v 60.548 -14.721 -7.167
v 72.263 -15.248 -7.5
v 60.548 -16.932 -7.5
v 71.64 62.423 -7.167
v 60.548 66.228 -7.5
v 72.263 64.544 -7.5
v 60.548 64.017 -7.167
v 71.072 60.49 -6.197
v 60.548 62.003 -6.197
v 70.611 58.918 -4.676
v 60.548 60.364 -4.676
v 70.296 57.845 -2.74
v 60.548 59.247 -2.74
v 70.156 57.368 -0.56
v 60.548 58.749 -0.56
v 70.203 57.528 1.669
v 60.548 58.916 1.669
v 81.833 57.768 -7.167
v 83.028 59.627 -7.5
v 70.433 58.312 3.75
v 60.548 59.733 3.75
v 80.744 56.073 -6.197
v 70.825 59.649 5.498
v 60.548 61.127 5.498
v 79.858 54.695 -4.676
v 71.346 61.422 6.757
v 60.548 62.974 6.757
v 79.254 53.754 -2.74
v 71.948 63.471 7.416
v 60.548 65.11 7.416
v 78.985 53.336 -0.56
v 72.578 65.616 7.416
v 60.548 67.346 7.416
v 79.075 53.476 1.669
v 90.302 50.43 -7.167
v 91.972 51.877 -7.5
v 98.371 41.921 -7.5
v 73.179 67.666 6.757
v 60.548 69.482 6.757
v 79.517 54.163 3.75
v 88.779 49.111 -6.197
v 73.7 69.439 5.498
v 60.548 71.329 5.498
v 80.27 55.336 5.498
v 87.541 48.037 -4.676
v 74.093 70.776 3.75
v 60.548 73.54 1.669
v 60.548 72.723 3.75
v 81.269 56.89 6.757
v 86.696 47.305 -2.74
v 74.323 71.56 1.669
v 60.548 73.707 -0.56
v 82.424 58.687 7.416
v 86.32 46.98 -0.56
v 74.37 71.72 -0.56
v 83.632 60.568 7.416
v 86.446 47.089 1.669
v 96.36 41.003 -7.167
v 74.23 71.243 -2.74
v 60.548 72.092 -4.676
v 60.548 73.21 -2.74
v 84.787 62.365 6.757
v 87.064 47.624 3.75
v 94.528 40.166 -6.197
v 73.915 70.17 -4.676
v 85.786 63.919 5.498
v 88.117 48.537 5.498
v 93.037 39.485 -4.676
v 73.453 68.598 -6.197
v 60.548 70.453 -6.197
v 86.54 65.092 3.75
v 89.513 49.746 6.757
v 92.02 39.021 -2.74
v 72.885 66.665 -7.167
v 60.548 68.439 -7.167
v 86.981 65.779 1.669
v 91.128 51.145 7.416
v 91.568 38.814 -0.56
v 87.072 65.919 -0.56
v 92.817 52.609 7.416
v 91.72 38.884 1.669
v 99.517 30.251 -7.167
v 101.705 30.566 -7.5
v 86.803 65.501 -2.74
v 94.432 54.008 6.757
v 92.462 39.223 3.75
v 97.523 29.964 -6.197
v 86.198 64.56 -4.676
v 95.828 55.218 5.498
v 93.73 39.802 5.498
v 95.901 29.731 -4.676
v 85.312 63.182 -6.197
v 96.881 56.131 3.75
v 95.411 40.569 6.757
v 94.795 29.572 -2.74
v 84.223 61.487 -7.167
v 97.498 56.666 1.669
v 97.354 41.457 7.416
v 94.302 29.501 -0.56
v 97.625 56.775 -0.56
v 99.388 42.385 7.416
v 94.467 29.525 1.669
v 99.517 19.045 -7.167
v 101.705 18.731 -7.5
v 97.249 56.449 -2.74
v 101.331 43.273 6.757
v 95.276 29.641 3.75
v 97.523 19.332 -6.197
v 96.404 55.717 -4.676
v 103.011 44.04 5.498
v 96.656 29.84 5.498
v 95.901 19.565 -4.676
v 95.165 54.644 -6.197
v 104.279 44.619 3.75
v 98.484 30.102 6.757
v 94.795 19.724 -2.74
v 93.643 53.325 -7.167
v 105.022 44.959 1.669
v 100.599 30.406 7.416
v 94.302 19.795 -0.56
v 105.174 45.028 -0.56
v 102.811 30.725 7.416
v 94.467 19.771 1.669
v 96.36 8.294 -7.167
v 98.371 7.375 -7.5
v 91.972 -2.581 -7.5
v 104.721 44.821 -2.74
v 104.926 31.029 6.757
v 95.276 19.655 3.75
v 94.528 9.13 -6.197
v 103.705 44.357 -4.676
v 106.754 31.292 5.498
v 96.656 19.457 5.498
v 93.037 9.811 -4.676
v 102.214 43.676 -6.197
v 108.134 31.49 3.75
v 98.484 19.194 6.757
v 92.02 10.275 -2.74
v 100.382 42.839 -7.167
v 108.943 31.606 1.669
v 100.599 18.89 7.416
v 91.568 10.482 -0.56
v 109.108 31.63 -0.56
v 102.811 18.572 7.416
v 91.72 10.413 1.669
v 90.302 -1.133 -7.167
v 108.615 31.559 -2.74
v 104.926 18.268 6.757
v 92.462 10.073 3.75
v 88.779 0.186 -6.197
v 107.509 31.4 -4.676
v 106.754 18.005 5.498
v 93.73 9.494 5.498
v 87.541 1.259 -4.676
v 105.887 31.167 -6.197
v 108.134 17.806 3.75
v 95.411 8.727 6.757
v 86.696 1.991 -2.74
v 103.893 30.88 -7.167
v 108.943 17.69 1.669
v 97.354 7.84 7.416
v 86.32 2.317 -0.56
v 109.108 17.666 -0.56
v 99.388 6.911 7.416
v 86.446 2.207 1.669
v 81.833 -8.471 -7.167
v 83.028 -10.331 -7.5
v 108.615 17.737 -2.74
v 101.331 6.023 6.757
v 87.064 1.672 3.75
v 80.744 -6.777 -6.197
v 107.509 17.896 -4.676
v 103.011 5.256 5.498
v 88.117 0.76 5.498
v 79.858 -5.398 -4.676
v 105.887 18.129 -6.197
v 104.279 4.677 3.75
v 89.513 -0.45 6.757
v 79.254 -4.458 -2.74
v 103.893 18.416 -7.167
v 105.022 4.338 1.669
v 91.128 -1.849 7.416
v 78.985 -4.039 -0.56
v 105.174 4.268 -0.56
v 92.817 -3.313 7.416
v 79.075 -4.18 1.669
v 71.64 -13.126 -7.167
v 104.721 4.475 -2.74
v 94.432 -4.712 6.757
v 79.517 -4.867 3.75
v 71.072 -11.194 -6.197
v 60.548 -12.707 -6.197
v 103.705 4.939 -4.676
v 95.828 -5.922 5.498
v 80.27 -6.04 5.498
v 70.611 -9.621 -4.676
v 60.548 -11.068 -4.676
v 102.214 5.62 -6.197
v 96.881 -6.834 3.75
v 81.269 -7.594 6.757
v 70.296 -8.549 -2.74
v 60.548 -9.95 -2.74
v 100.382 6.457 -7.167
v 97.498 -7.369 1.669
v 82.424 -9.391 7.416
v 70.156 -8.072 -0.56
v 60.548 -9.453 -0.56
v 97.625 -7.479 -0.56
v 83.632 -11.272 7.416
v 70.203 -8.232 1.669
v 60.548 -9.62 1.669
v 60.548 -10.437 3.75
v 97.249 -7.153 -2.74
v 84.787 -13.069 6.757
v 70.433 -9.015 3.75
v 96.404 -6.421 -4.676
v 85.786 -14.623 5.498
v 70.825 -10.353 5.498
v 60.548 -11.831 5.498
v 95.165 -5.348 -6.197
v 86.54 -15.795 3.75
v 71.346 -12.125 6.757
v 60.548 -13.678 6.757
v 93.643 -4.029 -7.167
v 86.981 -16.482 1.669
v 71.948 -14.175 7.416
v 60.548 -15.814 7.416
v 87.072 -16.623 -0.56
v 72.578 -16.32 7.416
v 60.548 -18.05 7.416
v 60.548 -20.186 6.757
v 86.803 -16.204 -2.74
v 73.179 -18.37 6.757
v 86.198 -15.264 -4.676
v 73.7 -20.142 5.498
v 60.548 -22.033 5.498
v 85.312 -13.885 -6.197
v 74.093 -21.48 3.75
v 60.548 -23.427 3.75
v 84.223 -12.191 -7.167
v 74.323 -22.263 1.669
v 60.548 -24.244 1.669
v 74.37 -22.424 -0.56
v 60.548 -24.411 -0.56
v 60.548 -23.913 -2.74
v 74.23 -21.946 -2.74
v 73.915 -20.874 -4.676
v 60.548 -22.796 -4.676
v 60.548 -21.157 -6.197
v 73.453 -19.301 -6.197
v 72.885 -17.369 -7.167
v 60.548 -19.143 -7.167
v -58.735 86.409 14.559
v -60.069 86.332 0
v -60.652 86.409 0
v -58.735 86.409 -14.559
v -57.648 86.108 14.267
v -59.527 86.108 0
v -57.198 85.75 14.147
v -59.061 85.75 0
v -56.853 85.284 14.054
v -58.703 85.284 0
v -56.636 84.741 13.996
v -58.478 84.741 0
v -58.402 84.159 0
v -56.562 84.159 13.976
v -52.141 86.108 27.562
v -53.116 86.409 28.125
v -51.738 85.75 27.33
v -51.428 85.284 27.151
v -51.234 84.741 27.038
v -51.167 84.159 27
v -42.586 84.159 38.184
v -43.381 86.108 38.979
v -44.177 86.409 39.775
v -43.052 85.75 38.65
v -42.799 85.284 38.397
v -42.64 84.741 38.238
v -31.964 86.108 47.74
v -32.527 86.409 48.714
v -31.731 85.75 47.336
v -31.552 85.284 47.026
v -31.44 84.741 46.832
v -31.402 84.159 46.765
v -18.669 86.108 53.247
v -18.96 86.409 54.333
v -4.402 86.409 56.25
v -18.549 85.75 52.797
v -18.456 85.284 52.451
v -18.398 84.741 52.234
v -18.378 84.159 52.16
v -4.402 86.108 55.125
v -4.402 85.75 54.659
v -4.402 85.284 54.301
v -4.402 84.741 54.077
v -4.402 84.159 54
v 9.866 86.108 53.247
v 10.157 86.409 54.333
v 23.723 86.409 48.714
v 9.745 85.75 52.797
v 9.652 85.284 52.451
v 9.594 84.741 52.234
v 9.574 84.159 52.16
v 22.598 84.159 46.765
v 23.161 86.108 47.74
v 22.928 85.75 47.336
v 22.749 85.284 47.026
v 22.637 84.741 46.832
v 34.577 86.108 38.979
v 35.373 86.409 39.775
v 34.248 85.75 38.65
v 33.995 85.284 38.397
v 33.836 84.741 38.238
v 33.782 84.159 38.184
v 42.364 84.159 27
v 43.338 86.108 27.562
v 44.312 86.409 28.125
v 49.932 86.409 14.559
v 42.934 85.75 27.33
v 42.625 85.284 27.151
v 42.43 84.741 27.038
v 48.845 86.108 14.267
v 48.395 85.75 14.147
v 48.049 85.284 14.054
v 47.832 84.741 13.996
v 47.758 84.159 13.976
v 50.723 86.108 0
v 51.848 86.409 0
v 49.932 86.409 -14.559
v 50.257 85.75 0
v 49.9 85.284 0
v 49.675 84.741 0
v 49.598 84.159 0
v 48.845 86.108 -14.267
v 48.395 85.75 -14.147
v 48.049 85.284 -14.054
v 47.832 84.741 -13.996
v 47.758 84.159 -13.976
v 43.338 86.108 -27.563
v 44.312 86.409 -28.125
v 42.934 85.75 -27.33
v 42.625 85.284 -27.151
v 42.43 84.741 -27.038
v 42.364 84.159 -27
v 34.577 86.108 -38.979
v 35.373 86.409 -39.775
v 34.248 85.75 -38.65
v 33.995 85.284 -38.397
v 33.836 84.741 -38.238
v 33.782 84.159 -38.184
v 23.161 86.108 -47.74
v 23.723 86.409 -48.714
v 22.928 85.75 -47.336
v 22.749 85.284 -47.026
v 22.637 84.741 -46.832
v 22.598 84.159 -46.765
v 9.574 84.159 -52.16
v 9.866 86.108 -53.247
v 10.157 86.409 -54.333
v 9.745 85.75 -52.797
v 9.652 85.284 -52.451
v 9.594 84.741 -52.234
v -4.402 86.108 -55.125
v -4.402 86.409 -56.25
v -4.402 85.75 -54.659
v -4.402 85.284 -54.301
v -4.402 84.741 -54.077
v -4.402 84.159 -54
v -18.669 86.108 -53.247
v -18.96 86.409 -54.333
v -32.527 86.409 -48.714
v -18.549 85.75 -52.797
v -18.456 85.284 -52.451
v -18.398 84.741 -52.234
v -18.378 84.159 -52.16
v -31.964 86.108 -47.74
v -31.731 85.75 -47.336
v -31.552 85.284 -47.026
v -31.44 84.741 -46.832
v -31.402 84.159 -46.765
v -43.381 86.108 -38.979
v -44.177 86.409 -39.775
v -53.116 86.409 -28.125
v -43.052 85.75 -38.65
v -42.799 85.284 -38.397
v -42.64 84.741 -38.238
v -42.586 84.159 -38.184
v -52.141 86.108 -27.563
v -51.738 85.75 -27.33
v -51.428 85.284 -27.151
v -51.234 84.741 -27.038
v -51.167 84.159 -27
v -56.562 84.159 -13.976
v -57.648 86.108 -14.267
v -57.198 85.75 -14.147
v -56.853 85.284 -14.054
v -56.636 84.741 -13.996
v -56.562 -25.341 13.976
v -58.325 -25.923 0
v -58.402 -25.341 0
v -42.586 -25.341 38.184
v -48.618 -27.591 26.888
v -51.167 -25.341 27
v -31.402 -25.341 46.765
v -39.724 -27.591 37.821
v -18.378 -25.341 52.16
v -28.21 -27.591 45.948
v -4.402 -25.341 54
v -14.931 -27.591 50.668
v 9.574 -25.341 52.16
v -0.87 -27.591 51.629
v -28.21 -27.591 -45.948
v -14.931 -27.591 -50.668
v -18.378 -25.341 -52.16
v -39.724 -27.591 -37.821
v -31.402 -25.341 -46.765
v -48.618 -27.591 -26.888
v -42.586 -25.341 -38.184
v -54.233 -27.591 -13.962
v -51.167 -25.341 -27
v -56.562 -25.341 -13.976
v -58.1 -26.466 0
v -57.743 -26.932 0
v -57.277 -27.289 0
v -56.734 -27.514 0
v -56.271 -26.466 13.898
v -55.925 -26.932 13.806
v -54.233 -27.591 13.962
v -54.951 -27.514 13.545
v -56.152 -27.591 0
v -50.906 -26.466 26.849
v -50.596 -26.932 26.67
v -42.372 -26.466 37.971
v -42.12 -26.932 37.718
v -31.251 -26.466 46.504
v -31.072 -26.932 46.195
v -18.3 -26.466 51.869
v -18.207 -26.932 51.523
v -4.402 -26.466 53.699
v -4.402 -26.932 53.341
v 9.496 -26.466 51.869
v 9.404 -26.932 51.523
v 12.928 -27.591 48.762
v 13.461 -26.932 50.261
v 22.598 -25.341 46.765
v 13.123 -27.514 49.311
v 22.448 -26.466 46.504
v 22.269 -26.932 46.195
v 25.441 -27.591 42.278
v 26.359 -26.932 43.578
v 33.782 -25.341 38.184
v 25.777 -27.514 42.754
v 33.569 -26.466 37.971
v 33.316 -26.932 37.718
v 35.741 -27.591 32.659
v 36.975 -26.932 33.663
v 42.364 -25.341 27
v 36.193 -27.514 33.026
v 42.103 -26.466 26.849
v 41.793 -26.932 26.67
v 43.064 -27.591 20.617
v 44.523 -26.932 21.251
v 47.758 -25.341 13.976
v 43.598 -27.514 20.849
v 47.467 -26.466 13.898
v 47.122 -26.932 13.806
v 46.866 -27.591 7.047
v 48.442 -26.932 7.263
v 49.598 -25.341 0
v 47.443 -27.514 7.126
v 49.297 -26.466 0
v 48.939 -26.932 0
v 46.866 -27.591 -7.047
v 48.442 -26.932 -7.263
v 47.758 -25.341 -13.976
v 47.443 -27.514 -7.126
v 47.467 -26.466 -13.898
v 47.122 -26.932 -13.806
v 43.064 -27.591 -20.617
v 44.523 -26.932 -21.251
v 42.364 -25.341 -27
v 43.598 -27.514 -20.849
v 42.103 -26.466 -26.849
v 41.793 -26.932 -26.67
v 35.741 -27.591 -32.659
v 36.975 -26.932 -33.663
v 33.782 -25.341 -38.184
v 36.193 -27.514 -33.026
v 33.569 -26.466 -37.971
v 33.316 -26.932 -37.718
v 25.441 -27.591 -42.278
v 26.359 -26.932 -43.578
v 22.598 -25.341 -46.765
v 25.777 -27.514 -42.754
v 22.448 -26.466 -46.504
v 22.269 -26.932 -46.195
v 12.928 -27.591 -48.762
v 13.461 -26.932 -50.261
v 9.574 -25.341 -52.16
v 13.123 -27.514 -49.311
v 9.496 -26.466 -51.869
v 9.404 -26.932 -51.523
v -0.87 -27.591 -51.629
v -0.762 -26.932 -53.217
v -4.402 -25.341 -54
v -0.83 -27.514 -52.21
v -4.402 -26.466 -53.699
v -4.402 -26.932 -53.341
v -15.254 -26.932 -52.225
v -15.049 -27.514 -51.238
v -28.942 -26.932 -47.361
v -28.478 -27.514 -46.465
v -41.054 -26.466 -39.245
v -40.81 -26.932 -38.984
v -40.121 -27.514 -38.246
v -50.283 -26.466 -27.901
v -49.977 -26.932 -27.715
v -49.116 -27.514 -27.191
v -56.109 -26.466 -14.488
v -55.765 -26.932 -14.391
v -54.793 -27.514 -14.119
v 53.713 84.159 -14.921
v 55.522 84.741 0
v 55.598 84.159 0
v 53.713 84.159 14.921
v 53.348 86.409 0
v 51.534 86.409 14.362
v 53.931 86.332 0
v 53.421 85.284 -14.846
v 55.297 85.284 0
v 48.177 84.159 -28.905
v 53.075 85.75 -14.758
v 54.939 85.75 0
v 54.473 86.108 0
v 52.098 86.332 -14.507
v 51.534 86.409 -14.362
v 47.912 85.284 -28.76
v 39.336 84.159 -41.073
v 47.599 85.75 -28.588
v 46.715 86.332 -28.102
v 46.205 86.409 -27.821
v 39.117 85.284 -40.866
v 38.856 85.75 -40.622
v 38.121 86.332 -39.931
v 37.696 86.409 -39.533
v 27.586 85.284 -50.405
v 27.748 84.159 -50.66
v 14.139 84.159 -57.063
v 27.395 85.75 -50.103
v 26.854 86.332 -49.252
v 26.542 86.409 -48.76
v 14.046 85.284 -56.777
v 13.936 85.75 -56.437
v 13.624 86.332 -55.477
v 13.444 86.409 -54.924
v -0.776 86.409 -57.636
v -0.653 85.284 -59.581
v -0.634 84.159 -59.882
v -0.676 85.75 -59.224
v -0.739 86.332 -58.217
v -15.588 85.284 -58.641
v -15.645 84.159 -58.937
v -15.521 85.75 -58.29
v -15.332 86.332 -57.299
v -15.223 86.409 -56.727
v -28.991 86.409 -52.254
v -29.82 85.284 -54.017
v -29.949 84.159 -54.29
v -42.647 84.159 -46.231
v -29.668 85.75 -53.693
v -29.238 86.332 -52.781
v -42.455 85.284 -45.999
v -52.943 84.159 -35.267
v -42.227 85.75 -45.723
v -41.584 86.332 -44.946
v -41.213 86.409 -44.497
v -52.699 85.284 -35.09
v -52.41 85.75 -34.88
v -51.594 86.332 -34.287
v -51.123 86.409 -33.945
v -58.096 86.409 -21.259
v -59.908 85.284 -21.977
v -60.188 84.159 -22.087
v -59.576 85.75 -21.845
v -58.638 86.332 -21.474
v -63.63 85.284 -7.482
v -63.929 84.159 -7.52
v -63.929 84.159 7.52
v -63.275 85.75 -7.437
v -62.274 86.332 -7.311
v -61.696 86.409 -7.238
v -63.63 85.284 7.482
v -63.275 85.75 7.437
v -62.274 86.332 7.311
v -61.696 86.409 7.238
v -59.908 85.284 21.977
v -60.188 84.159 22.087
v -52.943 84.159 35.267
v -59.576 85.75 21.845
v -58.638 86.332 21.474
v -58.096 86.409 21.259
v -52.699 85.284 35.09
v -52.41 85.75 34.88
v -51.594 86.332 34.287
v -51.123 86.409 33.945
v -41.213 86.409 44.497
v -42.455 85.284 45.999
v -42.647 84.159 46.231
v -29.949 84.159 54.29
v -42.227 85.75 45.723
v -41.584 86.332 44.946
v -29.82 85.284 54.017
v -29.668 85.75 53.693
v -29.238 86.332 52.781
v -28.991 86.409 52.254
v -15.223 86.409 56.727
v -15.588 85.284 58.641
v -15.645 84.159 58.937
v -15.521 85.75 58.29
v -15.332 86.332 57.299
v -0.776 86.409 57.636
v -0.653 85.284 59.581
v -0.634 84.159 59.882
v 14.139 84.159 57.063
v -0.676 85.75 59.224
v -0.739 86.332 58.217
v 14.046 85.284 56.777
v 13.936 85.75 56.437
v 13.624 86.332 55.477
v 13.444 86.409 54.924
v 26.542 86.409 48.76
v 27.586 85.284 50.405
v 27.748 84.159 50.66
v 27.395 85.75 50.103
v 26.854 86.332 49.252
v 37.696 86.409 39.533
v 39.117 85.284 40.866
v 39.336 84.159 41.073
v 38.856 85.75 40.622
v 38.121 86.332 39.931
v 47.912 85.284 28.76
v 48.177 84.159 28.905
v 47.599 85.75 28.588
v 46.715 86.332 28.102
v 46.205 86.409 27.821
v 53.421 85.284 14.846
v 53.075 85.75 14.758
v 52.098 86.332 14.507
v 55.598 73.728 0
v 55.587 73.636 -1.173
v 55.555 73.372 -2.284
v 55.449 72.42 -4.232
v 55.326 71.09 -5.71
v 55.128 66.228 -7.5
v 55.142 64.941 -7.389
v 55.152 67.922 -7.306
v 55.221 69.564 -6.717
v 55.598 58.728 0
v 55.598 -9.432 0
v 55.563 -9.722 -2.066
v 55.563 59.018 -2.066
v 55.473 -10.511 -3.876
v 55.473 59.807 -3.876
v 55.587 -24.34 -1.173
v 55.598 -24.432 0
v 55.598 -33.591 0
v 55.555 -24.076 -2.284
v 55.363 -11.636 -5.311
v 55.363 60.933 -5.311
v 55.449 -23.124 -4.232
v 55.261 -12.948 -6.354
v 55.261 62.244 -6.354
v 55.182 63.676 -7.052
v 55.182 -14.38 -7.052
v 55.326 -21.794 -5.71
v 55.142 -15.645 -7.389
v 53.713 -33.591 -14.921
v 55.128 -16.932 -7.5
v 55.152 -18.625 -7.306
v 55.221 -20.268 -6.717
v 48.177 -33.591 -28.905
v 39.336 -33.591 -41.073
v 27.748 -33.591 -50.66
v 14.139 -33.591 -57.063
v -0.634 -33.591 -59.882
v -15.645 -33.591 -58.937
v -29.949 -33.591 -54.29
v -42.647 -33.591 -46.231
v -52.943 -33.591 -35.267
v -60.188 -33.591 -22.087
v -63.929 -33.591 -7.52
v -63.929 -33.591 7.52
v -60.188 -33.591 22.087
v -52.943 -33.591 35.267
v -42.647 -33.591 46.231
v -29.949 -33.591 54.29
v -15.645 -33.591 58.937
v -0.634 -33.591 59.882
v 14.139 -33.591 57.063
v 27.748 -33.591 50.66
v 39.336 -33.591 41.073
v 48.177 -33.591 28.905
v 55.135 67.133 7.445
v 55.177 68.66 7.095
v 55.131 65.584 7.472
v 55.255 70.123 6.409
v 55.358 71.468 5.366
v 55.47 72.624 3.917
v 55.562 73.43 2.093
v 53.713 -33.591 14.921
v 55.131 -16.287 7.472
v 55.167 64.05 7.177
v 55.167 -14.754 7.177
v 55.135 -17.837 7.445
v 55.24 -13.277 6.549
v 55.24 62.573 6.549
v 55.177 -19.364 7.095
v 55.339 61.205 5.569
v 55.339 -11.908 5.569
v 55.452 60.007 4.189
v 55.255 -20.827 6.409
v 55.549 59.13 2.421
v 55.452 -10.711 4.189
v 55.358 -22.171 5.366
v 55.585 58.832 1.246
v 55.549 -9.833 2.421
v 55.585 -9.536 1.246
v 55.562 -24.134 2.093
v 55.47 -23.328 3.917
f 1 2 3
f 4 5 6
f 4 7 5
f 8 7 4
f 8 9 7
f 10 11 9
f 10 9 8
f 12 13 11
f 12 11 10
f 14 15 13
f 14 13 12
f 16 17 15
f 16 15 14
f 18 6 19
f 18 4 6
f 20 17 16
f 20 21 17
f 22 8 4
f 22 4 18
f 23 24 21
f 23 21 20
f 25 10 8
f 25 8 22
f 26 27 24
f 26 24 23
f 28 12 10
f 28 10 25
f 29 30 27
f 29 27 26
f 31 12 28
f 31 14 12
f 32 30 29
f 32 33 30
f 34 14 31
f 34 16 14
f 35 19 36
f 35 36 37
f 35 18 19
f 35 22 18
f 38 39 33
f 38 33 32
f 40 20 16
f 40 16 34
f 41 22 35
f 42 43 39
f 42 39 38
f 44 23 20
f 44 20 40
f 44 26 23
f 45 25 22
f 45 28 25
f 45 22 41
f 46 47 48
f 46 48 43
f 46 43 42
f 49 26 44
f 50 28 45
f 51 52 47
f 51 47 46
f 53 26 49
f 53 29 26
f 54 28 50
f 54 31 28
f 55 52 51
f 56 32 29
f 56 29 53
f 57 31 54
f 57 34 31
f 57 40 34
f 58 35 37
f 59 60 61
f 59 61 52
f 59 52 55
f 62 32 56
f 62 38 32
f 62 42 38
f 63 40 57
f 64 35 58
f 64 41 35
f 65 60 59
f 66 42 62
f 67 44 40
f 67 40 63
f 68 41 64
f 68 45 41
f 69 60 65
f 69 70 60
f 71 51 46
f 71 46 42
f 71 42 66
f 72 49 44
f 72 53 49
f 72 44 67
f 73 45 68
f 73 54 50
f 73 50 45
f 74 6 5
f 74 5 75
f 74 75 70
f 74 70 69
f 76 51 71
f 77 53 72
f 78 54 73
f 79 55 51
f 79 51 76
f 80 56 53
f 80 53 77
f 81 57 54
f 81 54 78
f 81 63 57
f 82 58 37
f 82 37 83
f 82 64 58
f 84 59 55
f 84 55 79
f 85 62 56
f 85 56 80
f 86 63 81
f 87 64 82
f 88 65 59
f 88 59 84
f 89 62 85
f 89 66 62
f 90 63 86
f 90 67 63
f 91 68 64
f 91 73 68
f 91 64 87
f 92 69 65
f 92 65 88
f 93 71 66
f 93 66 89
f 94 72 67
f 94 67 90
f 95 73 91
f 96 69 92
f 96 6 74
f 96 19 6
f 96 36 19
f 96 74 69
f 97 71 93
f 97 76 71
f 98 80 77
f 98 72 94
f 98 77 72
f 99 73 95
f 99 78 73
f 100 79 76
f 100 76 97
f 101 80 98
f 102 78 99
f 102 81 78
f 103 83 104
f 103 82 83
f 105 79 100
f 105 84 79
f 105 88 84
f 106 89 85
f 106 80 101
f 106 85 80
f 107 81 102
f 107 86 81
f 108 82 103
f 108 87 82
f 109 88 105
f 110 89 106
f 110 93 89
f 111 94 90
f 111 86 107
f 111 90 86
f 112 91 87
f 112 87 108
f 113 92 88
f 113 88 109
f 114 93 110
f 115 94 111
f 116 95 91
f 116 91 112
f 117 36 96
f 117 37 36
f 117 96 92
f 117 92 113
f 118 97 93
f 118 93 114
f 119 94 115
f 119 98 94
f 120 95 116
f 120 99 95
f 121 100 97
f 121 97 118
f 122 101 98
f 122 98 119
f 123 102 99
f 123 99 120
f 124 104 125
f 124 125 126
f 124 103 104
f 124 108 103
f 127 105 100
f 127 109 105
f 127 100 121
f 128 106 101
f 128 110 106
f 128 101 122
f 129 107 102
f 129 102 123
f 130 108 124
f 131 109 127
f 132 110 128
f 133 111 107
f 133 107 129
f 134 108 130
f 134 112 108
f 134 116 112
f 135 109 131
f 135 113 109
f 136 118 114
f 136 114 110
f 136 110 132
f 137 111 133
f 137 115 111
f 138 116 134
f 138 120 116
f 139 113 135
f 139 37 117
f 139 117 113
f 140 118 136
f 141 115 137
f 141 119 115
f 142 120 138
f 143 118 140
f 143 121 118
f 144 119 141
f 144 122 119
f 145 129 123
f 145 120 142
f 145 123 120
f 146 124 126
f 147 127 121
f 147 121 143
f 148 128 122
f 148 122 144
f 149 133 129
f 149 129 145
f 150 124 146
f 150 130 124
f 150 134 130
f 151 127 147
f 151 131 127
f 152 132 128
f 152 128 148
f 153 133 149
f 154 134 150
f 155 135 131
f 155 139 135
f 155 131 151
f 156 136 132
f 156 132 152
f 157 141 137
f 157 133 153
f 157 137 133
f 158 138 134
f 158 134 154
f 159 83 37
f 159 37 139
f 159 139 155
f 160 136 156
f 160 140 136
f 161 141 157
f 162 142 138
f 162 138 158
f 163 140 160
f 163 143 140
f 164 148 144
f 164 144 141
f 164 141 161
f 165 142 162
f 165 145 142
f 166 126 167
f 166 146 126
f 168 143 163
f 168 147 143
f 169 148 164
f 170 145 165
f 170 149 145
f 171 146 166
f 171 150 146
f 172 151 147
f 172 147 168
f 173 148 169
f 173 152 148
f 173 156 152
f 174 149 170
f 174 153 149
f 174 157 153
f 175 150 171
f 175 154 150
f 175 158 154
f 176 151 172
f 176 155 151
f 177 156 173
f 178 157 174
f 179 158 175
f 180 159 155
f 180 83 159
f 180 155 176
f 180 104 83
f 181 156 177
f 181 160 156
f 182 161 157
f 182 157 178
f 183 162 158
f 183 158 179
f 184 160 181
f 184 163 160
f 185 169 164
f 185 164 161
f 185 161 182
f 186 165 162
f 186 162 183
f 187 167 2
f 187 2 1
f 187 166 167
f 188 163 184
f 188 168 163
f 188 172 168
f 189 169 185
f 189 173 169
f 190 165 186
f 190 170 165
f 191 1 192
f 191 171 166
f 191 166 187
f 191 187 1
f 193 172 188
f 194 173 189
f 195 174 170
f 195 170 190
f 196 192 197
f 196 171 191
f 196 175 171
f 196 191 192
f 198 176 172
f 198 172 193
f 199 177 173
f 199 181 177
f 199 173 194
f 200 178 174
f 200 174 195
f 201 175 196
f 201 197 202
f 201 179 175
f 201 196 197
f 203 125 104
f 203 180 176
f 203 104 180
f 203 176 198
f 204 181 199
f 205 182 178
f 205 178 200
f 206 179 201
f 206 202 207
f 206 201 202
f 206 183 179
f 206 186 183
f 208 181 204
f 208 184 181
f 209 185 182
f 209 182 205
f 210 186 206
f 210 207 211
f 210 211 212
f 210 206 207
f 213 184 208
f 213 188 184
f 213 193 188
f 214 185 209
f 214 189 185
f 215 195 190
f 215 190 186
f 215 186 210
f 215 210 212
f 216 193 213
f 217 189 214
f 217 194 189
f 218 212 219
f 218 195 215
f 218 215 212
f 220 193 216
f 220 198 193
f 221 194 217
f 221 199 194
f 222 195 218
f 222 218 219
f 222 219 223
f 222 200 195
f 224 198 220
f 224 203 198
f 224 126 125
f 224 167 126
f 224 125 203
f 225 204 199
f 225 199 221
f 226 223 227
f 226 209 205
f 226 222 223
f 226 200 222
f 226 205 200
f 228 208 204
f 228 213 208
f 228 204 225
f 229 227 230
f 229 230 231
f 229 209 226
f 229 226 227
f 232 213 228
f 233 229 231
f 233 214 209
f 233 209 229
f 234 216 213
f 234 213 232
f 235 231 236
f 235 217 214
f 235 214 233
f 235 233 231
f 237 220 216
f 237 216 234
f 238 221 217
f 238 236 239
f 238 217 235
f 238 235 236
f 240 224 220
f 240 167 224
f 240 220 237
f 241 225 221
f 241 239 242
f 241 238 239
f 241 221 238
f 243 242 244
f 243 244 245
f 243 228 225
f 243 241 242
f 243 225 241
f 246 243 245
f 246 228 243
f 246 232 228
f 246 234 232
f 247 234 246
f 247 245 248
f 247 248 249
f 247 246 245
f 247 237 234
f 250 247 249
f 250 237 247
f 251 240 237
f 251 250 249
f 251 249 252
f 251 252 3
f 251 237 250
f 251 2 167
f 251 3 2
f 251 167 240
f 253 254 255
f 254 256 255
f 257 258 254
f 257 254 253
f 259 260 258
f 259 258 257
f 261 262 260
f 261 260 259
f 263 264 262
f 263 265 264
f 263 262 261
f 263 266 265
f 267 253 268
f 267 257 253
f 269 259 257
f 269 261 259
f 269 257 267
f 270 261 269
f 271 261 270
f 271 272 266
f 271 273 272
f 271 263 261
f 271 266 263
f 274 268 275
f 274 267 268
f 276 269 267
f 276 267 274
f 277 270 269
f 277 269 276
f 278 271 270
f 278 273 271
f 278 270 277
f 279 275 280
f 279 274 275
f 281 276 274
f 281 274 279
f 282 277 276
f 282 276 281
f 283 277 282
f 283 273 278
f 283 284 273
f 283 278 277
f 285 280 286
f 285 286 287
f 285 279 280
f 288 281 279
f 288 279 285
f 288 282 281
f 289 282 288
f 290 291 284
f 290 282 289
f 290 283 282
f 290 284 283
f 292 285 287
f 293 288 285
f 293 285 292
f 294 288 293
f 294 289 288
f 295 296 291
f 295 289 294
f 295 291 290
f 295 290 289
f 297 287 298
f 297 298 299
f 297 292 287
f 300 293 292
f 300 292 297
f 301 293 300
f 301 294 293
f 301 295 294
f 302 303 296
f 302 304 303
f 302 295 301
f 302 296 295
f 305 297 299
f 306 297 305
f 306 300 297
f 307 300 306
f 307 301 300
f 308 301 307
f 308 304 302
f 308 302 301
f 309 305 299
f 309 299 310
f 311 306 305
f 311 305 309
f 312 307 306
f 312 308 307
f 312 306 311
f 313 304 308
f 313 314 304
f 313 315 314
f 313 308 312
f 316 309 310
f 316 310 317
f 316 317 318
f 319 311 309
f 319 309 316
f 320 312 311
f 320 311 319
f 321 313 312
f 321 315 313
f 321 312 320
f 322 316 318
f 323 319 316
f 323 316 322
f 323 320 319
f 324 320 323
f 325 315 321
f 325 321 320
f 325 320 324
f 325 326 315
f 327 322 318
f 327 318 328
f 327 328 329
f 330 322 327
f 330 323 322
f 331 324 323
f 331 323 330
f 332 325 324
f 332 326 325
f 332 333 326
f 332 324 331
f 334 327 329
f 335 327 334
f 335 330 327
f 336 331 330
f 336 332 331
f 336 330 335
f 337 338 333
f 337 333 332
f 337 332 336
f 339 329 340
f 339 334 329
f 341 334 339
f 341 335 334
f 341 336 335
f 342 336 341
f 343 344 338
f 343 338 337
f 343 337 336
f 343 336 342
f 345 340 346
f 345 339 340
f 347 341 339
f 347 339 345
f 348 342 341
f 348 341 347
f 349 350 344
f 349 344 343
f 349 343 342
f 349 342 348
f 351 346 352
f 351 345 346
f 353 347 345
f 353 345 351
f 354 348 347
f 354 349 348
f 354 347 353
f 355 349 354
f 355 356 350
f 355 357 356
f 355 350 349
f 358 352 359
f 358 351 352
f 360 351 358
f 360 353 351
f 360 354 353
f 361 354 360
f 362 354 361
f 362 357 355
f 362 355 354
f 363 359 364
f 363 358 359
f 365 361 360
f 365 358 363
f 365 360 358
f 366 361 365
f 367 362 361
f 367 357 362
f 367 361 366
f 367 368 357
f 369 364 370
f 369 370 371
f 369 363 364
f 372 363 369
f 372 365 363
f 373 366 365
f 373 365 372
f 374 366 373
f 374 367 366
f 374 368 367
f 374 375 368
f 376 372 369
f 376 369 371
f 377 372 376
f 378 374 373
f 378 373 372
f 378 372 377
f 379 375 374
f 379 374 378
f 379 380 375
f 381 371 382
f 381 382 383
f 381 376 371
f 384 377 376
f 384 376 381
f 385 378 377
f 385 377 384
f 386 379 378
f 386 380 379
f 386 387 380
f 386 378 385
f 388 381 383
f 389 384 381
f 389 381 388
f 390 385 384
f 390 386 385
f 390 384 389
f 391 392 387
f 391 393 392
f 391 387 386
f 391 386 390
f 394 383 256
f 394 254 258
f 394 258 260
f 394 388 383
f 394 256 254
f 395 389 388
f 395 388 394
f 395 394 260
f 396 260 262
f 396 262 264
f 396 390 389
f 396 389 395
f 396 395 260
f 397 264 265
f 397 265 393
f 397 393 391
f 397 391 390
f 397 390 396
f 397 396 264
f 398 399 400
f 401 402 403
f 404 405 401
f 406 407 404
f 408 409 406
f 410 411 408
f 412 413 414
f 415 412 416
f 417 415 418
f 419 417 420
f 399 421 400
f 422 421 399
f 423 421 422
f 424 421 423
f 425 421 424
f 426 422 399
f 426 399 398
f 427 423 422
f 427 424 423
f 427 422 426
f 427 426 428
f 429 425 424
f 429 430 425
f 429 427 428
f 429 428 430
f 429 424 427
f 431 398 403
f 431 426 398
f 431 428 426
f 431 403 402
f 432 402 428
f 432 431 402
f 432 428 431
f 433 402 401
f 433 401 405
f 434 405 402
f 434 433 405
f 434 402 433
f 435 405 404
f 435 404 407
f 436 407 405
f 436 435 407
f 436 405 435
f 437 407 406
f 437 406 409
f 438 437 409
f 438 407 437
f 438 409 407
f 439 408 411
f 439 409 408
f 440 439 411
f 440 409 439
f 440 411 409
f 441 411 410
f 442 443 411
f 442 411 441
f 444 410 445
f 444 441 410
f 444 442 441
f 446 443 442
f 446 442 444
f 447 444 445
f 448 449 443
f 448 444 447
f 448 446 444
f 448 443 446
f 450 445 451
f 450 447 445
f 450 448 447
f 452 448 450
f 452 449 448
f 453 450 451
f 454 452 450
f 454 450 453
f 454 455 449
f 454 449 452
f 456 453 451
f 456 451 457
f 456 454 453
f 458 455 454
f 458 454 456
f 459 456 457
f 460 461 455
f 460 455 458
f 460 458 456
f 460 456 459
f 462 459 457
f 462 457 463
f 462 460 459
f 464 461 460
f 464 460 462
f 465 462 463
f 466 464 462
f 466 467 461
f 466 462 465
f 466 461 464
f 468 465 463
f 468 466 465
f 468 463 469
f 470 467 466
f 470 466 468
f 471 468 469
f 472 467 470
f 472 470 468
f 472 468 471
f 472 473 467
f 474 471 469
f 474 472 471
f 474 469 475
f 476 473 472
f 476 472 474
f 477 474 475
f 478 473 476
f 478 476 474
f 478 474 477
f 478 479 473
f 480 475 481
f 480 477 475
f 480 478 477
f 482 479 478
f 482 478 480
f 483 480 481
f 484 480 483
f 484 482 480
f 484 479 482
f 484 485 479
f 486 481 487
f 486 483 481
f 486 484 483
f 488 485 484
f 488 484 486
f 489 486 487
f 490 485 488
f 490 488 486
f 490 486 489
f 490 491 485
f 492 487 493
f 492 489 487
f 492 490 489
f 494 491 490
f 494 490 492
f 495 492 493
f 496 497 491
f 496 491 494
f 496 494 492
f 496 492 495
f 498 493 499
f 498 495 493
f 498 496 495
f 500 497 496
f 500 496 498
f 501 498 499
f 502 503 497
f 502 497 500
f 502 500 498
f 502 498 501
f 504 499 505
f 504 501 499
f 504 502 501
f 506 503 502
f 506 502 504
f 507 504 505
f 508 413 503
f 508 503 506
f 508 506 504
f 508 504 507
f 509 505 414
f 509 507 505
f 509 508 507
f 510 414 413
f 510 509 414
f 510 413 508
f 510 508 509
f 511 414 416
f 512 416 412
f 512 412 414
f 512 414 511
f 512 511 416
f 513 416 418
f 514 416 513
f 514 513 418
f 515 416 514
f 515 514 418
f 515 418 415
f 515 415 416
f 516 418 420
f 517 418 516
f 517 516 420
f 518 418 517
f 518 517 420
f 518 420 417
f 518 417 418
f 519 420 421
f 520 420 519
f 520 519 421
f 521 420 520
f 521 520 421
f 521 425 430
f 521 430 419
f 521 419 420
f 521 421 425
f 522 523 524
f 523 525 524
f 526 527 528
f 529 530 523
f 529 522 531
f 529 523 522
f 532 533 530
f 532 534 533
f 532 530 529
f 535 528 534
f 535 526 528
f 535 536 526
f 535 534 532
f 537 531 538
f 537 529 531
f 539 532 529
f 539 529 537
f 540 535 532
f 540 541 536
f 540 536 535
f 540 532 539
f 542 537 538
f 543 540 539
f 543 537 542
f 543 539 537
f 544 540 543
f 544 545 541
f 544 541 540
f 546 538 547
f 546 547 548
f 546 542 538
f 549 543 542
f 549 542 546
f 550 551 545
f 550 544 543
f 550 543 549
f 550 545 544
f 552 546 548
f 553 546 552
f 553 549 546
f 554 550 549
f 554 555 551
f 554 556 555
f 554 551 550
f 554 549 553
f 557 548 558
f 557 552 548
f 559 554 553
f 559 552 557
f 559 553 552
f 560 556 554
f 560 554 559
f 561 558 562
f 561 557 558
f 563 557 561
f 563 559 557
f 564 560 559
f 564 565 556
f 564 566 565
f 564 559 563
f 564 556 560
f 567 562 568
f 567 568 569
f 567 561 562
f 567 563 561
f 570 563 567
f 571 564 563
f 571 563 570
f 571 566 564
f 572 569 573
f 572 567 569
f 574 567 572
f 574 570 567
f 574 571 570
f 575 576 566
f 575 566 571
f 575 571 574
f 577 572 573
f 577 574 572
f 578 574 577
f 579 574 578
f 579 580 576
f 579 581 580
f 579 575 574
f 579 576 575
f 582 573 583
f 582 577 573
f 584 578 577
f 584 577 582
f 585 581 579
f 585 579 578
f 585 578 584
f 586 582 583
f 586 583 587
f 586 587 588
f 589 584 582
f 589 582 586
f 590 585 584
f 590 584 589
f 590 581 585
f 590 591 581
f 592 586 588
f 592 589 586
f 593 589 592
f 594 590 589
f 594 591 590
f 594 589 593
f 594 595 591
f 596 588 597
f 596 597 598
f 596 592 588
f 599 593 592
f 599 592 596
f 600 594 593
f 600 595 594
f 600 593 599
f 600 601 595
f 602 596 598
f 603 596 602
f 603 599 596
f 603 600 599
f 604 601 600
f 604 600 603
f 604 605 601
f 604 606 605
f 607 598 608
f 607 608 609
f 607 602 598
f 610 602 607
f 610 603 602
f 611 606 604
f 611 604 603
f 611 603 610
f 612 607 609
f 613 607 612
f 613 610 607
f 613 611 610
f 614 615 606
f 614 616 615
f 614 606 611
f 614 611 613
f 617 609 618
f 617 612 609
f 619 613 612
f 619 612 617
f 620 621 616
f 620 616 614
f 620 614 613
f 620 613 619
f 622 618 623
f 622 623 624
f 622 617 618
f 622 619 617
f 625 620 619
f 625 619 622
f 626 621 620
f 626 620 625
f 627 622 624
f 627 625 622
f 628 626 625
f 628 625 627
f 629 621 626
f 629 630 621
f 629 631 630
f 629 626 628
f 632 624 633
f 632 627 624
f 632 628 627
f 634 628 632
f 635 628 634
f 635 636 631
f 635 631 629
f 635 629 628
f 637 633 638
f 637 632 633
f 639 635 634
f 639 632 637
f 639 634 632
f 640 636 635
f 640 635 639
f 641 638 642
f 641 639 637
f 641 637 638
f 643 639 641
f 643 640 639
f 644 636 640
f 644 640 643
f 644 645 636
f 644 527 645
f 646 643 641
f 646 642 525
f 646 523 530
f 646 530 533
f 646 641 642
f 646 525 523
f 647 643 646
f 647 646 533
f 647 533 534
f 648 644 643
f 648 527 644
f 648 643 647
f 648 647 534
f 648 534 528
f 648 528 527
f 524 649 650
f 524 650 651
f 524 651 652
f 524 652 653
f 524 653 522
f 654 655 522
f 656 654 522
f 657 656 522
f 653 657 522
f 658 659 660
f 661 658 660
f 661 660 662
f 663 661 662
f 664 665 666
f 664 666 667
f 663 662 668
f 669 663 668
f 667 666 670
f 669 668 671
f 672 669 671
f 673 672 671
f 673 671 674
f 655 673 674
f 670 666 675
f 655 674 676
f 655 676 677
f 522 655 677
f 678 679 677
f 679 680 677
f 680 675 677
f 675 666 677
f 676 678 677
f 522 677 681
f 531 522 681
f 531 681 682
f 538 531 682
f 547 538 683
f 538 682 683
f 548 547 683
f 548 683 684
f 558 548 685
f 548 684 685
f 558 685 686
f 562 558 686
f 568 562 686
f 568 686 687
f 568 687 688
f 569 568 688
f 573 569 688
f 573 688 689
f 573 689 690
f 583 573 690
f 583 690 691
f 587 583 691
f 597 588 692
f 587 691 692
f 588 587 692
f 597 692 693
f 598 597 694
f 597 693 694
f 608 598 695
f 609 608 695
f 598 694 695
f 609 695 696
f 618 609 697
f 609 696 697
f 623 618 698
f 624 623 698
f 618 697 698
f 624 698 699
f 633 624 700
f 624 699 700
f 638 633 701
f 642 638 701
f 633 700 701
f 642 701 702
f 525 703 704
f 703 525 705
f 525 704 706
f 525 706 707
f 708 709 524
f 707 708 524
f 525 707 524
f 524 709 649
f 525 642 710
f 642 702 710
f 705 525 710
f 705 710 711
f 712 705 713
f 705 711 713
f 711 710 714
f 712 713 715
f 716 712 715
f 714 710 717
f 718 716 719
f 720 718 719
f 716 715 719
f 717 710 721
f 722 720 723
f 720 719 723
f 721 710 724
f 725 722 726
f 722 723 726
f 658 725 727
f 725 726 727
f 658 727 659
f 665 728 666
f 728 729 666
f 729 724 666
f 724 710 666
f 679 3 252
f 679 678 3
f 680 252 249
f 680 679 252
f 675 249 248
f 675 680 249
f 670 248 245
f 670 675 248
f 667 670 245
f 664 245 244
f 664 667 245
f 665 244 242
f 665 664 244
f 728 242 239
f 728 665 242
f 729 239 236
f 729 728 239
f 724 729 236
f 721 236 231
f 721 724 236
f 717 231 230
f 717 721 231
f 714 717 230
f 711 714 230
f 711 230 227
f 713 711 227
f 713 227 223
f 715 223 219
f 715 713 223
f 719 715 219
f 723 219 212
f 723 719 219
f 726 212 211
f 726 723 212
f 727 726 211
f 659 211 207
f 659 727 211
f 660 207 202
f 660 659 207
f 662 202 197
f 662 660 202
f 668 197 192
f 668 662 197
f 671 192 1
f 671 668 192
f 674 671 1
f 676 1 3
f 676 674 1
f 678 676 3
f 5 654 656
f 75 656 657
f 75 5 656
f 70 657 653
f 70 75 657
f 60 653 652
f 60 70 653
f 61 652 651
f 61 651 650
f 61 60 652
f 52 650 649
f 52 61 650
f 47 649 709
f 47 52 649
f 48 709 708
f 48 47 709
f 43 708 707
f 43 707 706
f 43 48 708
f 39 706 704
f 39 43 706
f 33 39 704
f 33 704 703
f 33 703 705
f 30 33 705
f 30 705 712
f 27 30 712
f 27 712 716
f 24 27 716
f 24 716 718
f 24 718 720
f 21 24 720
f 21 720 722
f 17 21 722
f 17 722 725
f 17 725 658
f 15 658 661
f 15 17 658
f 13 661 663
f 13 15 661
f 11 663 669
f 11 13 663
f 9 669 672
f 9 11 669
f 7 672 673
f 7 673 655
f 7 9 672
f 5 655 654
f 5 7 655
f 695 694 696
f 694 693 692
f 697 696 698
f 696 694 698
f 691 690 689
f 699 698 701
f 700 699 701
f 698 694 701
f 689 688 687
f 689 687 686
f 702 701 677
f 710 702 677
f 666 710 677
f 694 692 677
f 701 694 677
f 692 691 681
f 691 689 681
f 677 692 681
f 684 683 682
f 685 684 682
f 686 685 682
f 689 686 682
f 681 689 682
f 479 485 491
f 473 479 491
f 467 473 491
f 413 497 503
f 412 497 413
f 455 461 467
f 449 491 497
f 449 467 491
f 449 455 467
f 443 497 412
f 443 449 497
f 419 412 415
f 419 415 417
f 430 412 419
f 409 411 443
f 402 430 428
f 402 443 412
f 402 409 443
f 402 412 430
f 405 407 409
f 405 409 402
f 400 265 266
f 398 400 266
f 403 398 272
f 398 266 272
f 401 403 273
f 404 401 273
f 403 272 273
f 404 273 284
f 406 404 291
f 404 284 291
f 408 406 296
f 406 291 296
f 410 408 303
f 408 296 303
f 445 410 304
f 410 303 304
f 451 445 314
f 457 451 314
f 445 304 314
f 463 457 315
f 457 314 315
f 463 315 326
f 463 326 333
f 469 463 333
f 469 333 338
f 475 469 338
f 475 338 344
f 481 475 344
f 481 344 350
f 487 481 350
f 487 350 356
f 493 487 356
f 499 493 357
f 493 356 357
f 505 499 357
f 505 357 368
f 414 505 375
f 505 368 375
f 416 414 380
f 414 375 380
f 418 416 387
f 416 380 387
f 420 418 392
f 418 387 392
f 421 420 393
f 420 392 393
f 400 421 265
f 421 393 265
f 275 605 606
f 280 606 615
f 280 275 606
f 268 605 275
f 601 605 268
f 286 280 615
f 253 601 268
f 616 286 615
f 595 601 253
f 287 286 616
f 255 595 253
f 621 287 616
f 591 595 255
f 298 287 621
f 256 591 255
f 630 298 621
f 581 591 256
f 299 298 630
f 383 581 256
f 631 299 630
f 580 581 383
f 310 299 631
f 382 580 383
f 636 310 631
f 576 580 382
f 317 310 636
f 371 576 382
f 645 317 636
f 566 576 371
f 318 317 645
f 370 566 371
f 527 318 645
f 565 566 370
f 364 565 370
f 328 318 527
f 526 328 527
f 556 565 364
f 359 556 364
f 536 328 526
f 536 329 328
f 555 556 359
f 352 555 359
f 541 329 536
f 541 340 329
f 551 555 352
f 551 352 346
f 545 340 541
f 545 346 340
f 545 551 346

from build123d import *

# Parameters (mm, degrees)
SKETCH1_R          = 20
EXTRUDE1_DEPTH     = 40
SKETCH2_R          = 2.5
SKETCH4_R          = 18
CUT_EXTRUDE1_DEPTH = 38
FILLET1_R          = 0.75
FILLET2_R          = 0.75
SCALE1_SCALE       = 2.5
SCALE2_SCALE       = 1.2


with BuildPart() as part:
    # Sketch1 → Extrude1 (new body)
    with BuildSketch(Plane(origin=(0, 0, 0), x_dir=(1, 0, 0), z_dir=(0, 1, 0))):
        Circle(SKETCH1_R)
    extrude(amount=EXTRUDE1_DEPTH)

    # Sweep1: sweep along a path in Sketch3
    with BuildLine(Plane.XY) as sweep1_path:
        Line((0, 30.773001508), (21.65, 30.773001508))
        ThreePointArc((21.65, 30.773001508), (33.01, 19.413001508), (21.65, 8.053001508))
        Line((21.65, 8.053001508), (0, 8.053001508))
    # Sketch2 → Sweep1 (sweep)
    with BuildSketch(Plane(origin=(0, 0, 0), x_dir=(0, 0, -1), z_dir=(1, 0, 0))):
        with Locations((0, 33.273001508)):
            Circle(SKETCH2_R)
    sweep(path=sweep1_path.line)

    # Sketch4 → Cut-Extrude1 (cut)
    with BuildSketch(Plane(origin=(0, 40, 0), x_dir=(-1, 0, 0), z_dir=(0, 1, 0))):
        Circle(SKETCH4_R)
    extrude(amount=-CUT_EXTRUDE1_DEPTH, mode=Mode.SUBTRACT)

    # Fillet1
    fillet1_edges = [part.edges().sort_by_distance(p)[0] for p in [
        (18, 40, 0),
        (-20, 40, 0),
    ]]
    fillet(fillet1_edges, radius=FILLET1_R)

    # Fillet2
    fillet2_edges = [part.edges().sort_by_distance(p)[0] for p in [
        (18, 2, 0),
    ]]
    fillet(fillet2_edges, radius=FILLET2_R)


with BuildPart() as part_1:
    # Scale1: scaled about (2.200885097, 16.795438051, 2.029e-06)
    add(part.part.scale(SCALE1_SCALE).moved(Location((-3.301327645, -25.193157077, -3.043e-06))))


with BuildPart() as part_2:
    # Scale2: scaled about (2.200885096, 16.795438052, 2.029e-06)
    add(part_1.part.scale(SCALE2_SCALE).moved(Location((-0.440177019, -3.35908761, -4.06e-07))))


solid = part_2.part
